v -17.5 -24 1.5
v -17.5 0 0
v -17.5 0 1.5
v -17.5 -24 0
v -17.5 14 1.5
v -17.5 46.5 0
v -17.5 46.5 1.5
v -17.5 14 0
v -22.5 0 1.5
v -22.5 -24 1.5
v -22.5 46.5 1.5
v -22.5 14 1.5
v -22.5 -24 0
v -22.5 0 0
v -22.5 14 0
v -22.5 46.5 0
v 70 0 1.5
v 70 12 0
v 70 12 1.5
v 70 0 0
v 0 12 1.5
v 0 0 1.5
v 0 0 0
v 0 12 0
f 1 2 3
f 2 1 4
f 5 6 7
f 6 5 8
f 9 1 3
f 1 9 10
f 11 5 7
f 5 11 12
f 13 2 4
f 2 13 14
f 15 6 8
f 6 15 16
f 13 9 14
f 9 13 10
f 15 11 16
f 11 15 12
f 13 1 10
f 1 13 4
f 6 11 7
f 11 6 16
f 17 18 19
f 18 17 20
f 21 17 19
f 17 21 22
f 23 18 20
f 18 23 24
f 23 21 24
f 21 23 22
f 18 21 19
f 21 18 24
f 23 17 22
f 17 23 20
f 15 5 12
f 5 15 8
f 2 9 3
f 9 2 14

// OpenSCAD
// Agarose gel comb - a flat plate with a back bar and a row of rectangular teeth, for casting
// horizontal gels. NOVEL general part.
//

cols   = 10;
teeth_d = 5.0;
teeth_l = 12;
pitch  = 1.5;
base_t = 1.5;
back_w = 12;

$fn = 48;

P = max(pitch, teeth_d + 1.5);                 // keep a material wall between teeth
L = 70;                                        // spine length (X)
w = back_w + 2 * teeth_l + (cols - 1) * P;    // total width (Y)

difference() {
    union() {
        cube([L, back_w, base_t]);                 // spine (back bar)
        for (i = [0 : cols - 1])
            translate([L / 2 - (cols / 2) * (teeth_d + P), -teeth_l - back_w + i * P, 0])
                cube([teeth_d, teeth_l, base_t]);   // teeth, hanging in the -Y direction
    }
    for (i = [0 : cols - 1])
        translate([L / 2 - (cols / 2) * (teeth_d + P), 0, -1])
            cube([teeth_d + 0.5, teeth_l + 2, base_t + 2]);   // pocket for each tooth
}
